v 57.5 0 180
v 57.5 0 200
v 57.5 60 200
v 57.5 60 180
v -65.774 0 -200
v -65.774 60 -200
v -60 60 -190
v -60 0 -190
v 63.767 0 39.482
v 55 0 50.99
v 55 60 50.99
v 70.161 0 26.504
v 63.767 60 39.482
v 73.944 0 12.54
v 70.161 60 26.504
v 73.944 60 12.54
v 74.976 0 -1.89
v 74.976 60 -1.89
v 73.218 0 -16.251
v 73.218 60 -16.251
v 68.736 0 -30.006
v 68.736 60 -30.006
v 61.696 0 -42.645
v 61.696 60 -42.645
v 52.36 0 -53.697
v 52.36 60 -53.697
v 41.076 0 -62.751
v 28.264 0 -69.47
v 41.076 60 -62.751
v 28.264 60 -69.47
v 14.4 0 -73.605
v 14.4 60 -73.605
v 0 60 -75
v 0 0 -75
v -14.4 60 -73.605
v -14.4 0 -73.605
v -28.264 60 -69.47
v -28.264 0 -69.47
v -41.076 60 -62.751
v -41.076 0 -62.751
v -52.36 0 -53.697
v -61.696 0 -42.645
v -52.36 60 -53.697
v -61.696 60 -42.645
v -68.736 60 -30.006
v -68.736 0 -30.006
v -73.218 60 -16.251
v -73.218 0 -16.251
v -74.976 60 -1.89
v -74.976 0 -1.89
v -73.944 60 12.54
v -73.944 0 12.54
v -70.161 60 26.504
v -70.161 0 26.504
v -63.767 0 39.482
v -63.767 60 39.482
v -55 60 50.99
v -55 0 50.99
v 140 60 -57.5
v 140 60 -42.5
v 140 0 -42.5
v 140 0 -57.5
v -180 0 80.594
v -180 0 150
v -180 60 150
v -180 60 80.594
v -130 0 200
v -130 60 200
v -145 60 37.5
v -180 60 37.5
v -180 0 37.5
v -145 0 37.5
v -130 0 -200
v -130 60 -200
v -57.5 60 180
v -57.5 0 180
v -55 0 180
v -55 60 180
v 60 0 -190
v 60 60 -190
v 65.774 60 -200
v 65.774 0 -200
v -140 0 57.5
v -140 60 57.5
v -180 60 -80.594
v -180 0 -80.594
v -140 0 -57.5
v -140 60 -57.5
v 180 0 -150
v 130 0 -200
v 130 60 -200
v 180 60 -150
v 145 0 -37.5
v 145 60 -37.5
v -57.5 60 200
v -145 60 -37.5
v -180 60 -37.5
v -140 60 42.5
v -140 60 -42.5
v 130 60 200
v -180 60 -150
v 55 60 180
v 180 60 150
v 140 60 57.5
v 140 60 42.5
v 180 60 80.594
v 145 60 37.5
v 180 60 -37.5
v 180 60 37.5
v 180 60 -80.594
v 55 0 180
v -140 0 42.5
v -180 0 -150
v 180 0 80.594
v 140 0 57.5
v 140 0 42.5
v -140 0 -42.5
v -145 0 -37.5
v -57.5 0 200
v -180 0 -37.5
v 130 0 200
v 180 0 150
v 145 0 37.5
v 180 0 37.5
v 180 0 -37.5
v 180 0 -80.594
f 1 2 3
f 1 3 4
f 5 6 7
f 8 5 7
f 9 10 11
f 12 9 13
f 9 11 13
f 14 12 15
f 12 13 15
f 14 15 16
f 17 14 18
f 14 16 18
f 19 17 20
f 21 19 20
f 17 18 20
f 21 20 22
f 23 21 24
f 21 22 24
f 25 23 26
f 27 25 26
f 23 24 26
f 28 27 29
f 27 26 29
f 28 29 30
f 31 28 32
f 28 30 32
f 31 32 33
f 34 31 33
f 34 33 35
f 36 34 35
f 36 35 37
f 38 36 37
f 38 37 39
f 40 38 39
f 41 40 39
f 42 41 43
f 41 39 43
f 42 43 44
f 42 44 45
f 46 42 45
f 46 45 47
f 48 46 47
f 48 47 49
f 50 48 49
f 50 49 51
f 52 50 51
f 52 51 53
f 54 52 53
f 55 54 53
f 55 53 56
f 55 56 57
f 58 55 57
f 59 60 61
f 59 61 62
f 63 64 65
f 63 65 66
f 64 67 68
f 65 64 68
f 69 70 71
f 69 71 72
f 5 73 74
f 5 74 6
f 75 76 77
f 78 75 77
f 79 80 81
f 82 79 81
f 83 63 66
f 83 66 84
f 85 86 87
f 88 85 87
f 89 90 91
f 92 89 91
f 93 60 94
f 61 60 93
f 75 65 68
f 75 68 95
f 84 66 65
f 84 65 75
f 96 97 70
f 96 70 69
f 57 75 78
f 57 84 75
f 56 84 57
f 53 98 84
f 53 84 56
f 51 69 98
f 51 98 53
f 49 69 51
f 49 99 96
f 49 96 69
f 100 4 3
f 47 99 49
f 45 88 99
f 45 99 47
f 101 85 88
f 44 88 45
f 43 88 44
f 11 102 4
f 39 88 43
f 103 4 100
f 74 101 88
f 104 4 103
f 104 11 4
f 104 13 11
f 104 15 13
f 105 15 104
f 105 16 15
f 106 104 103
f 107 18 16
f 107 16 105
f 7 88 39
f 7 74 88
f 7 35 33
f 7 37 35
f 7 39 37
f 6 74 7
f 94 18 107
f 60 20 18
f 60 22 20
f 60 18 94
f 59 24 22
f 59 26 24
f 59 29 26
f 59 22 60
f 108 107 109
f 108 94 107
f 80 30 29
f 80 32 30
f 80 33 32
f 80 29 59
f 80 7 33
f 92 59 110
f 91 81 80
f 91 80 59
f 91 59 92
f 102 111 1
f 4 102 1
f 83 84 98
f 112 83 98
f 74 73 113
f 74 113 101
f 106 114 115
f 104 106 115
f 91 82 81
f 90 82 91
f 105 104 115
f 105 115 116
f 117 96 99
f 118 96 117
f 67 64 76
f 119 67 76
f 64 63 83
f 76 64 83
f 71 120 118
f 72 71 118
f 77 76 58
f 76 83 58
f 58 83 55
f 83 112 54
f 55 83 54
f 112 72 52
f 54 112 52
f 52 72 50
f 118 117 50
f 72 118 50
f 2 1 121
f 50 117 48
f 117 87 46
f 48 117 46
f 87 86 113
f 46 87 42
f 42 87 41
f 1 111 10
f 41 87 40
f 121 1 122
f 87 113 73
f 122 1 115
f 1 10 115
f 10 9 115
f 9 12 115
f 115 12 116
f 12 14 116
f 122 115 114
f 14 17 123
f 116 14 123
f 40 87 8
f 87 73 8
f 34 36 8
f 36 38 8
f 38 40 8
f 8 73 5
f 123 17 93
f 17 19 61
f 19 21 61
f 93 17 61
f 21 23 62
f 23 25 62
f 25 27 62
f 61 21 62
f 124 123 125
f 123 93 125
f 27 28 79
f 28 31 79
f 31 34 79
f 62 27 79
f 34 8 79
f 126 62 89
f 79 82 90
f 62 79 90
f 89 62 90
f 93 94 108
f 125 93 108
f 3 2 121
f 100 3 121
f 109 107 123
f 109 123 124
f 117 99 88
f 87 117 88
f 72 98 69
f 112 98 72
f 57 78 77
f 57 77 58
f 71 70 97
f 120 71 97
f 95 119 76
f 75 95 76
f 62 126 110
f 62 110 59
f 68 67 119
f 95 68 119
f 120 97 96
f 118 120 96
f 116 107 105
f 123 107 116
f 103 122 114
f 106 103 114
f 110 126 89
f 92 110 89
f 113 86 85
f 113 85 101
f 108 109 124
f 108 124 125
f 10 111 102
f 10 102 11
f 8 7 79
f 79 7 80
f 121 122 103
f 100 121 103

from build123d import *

# Parameters (mm, degrees)
SKETCH_1_W          = 360
SKETCH_1_H          = 400
EXTRUDE_1_DEPTH     = 60
CHAMFER_1_SIZE      = 50
SKETCH_2_W          = 40
SKETCH_2_H          = 115
CUT_EXTRUDE_1_DEPTH = 276.680975042
CUT_EXTRUDE_2_DEPTH = 60
SKETCH_4_W          = 110
SKETCH_4_H          = 95
SKETCH_4_H_2        = 20
SKETCH_4_W_2        = 2.5
CUT_EXTRUDE_3_DEPTH = 276.680975042
SKETCH_5_W          = 40
SKETCH_5_H          = 75
EXTRUDE_2_DEPTH     = 60
CUT_EXTRUDE_4_DEPTH = 60
SKETCH_7_R          = 75
CUT_EXTRUDE_5_DEPTH = 60
CUT_EXTRUDE_6_DEPTH = 60
CHAMFER_2_SIZE      = 5


with BuildPart() as part:
    # 草图1 → 凸台-拉伸1 (new body)
    with BuildSketch(Plane(origin=(0, 0, 0), x_dir=(1, 0, 0), z_dir=(0, 1, 0))):
        Rectangle(SKETCH_1_W, SKETCH_1_H)
    extrude(amount=EXTRUDE_1_DEPTH)

    # 倒角1
    chamfer_1_edges = [part.edges().sort_by_distance(p)[0] for p in [
        (180, 30, 200),
        (-180, 30, 200),
        (-180, 30, -200),
        (180, 30, -200),
    ]]
    chamfer(chamfer_1_edges, length=CHAMFER_1_SIZE)

    # 草图2 → 切除-拉伸1 (cut, through all)
    with BuildSketch(Plane(origin=(0, 60, 0), x_dir=(1, 0, 0), z_dir=(0, 1, 0))):
        with Locations((-160, 0)):
            Rectangle(SKETCH_2_W, SKETCH_2_H)
        with Locations((160, 0)):
            Rectangle(SKETCH_2_W, SKETCH_2_H)
    extrude(amount=-CUT_EXTRUDE_1_DEPTH, mode=Mode.SUBTRACT)

    # 草图3 → 切除-拉伸2 (cut)
    with BuildSketch(Plane(origin=(0, 60, 0), x_dir=(1, 0, 0), z_dir=(0, 1, 0))):
        Polygon((-140, -57.5), (-180, -57.5), (-180, -80.594010768), align=None)
        Polygon((-180, 80.594010768), (-140, 57.5), (-180, 57.5), align=None)
        Polygon((140, 57.5), (180, 57.5), (180, 80.594010768), align=None)
        Polygon((180, -80.594010768), (140, -57.5), (180, -57.5), align=None)
    extrude(amount=-CUT_EXTRUDE_2_DEPTH, mode=Mode.SUBTRACT)

    # 草图4 → 切除-拉伸3 (cut, through all)
    with BuildSketch(Plane(origin=(0, 0, 0), x_dir=(1, 0, 0), z_dir=(0, 1, 0))):
        with Locations((0, -132.5)):
            Rectangle(SKETCH_4_W, SKETCH_4_H)
        with Locations((0, -190)):
            Rectangle(SKETCH_4_W, SKETCH_4_H_2)
        with Locations((-56.25, -190)):
            Rectangle(SKETCH_4_W_2, SKETCH_4_H_2)
        with Locations((56.25, -190)):
            Rectangle(SKETCH_4_W_2, SKETCH_4_H_2)
    extrude(amount=CUT_EXTRUDE_3_DEPTH, mode=Mode.SUBTRACT)

    # 草图5 → 凸台-拉伸2 (add)
    with BuildSketch(Plane(origin=(0, 60, 0), x_dir=(1, 0, 0), z_dir=(0, 1, 0))):
        with Locations((-160, 0)):
            Rectangle(SKETCH_5_W, SKETCH_5_H)
        with Locations((160, 0)):
            Rectangle(SKETCH_5_W, SKETCH_5_H)
    extrude(amount=-EXTRUDE_2_DEPTH)

    # 草图6 → 切除-拉伸4 (cut)
    with BuildSketch(Plane(origin=(0, 60, 0), x_dir=(1, 0, 0), z_dir=(0, 1, 0))):
        Polygon((-65.773502692, 200), (-60, 190), (60, 190), (65.773502692, 200), align=None)
    extrude(amount=-CUT_EXTRUDE_4_DEPTH, mode=Mode.SUBTRACT)

    # 草图7 → 切除-拉伸5 (cut)
    with BuildSketch(Plane(origin=(0, 60, 0), x_dir=(1, 0, 0), z_dir=(0, 1, 0))):
        with Locations(Location((0, 0, 0), (0, 0, 270))):
            Circle(SKETCH_7_R)
    extrude(amount=-CUT_EXTRUDE_5_DEPTH, mode=Mode.SUBTRACT)

    # 草图8 → 切除-拉伸6 (cut)
    with BuildSketch(Plane(origin=(0, 60, 0), x_dir=(1, 0, 0), z_dir=(0, 1, 0))):
        with BuildLine():
            Line((-55, -85), (-55, -50.990195136))
            ThreePointArc((-55, -50.990195136), (0, -75), (55, -50.990195136))
            Line((55, -50.990195136), (55, -85))
            Line((55, -85), (-55, -85))
        make_face()
    extrude(amount=-CUT_EXTRUDE_6_DEPTH, mode=Mode.SUBTRACT)

    # 倒角2
    chamfer_2_edges = [part.edges().sort_by_distance(p)[0] for p in [
        (-140, 30, -37.5),
        (-140, 30, 37.5),
        (140, 30, 37.5),
        (140, 30, -37.5),
    ]]
    chamfer(chamfer_2_edges, length=CHAMFER_2_SIZE)


solid = part.part
